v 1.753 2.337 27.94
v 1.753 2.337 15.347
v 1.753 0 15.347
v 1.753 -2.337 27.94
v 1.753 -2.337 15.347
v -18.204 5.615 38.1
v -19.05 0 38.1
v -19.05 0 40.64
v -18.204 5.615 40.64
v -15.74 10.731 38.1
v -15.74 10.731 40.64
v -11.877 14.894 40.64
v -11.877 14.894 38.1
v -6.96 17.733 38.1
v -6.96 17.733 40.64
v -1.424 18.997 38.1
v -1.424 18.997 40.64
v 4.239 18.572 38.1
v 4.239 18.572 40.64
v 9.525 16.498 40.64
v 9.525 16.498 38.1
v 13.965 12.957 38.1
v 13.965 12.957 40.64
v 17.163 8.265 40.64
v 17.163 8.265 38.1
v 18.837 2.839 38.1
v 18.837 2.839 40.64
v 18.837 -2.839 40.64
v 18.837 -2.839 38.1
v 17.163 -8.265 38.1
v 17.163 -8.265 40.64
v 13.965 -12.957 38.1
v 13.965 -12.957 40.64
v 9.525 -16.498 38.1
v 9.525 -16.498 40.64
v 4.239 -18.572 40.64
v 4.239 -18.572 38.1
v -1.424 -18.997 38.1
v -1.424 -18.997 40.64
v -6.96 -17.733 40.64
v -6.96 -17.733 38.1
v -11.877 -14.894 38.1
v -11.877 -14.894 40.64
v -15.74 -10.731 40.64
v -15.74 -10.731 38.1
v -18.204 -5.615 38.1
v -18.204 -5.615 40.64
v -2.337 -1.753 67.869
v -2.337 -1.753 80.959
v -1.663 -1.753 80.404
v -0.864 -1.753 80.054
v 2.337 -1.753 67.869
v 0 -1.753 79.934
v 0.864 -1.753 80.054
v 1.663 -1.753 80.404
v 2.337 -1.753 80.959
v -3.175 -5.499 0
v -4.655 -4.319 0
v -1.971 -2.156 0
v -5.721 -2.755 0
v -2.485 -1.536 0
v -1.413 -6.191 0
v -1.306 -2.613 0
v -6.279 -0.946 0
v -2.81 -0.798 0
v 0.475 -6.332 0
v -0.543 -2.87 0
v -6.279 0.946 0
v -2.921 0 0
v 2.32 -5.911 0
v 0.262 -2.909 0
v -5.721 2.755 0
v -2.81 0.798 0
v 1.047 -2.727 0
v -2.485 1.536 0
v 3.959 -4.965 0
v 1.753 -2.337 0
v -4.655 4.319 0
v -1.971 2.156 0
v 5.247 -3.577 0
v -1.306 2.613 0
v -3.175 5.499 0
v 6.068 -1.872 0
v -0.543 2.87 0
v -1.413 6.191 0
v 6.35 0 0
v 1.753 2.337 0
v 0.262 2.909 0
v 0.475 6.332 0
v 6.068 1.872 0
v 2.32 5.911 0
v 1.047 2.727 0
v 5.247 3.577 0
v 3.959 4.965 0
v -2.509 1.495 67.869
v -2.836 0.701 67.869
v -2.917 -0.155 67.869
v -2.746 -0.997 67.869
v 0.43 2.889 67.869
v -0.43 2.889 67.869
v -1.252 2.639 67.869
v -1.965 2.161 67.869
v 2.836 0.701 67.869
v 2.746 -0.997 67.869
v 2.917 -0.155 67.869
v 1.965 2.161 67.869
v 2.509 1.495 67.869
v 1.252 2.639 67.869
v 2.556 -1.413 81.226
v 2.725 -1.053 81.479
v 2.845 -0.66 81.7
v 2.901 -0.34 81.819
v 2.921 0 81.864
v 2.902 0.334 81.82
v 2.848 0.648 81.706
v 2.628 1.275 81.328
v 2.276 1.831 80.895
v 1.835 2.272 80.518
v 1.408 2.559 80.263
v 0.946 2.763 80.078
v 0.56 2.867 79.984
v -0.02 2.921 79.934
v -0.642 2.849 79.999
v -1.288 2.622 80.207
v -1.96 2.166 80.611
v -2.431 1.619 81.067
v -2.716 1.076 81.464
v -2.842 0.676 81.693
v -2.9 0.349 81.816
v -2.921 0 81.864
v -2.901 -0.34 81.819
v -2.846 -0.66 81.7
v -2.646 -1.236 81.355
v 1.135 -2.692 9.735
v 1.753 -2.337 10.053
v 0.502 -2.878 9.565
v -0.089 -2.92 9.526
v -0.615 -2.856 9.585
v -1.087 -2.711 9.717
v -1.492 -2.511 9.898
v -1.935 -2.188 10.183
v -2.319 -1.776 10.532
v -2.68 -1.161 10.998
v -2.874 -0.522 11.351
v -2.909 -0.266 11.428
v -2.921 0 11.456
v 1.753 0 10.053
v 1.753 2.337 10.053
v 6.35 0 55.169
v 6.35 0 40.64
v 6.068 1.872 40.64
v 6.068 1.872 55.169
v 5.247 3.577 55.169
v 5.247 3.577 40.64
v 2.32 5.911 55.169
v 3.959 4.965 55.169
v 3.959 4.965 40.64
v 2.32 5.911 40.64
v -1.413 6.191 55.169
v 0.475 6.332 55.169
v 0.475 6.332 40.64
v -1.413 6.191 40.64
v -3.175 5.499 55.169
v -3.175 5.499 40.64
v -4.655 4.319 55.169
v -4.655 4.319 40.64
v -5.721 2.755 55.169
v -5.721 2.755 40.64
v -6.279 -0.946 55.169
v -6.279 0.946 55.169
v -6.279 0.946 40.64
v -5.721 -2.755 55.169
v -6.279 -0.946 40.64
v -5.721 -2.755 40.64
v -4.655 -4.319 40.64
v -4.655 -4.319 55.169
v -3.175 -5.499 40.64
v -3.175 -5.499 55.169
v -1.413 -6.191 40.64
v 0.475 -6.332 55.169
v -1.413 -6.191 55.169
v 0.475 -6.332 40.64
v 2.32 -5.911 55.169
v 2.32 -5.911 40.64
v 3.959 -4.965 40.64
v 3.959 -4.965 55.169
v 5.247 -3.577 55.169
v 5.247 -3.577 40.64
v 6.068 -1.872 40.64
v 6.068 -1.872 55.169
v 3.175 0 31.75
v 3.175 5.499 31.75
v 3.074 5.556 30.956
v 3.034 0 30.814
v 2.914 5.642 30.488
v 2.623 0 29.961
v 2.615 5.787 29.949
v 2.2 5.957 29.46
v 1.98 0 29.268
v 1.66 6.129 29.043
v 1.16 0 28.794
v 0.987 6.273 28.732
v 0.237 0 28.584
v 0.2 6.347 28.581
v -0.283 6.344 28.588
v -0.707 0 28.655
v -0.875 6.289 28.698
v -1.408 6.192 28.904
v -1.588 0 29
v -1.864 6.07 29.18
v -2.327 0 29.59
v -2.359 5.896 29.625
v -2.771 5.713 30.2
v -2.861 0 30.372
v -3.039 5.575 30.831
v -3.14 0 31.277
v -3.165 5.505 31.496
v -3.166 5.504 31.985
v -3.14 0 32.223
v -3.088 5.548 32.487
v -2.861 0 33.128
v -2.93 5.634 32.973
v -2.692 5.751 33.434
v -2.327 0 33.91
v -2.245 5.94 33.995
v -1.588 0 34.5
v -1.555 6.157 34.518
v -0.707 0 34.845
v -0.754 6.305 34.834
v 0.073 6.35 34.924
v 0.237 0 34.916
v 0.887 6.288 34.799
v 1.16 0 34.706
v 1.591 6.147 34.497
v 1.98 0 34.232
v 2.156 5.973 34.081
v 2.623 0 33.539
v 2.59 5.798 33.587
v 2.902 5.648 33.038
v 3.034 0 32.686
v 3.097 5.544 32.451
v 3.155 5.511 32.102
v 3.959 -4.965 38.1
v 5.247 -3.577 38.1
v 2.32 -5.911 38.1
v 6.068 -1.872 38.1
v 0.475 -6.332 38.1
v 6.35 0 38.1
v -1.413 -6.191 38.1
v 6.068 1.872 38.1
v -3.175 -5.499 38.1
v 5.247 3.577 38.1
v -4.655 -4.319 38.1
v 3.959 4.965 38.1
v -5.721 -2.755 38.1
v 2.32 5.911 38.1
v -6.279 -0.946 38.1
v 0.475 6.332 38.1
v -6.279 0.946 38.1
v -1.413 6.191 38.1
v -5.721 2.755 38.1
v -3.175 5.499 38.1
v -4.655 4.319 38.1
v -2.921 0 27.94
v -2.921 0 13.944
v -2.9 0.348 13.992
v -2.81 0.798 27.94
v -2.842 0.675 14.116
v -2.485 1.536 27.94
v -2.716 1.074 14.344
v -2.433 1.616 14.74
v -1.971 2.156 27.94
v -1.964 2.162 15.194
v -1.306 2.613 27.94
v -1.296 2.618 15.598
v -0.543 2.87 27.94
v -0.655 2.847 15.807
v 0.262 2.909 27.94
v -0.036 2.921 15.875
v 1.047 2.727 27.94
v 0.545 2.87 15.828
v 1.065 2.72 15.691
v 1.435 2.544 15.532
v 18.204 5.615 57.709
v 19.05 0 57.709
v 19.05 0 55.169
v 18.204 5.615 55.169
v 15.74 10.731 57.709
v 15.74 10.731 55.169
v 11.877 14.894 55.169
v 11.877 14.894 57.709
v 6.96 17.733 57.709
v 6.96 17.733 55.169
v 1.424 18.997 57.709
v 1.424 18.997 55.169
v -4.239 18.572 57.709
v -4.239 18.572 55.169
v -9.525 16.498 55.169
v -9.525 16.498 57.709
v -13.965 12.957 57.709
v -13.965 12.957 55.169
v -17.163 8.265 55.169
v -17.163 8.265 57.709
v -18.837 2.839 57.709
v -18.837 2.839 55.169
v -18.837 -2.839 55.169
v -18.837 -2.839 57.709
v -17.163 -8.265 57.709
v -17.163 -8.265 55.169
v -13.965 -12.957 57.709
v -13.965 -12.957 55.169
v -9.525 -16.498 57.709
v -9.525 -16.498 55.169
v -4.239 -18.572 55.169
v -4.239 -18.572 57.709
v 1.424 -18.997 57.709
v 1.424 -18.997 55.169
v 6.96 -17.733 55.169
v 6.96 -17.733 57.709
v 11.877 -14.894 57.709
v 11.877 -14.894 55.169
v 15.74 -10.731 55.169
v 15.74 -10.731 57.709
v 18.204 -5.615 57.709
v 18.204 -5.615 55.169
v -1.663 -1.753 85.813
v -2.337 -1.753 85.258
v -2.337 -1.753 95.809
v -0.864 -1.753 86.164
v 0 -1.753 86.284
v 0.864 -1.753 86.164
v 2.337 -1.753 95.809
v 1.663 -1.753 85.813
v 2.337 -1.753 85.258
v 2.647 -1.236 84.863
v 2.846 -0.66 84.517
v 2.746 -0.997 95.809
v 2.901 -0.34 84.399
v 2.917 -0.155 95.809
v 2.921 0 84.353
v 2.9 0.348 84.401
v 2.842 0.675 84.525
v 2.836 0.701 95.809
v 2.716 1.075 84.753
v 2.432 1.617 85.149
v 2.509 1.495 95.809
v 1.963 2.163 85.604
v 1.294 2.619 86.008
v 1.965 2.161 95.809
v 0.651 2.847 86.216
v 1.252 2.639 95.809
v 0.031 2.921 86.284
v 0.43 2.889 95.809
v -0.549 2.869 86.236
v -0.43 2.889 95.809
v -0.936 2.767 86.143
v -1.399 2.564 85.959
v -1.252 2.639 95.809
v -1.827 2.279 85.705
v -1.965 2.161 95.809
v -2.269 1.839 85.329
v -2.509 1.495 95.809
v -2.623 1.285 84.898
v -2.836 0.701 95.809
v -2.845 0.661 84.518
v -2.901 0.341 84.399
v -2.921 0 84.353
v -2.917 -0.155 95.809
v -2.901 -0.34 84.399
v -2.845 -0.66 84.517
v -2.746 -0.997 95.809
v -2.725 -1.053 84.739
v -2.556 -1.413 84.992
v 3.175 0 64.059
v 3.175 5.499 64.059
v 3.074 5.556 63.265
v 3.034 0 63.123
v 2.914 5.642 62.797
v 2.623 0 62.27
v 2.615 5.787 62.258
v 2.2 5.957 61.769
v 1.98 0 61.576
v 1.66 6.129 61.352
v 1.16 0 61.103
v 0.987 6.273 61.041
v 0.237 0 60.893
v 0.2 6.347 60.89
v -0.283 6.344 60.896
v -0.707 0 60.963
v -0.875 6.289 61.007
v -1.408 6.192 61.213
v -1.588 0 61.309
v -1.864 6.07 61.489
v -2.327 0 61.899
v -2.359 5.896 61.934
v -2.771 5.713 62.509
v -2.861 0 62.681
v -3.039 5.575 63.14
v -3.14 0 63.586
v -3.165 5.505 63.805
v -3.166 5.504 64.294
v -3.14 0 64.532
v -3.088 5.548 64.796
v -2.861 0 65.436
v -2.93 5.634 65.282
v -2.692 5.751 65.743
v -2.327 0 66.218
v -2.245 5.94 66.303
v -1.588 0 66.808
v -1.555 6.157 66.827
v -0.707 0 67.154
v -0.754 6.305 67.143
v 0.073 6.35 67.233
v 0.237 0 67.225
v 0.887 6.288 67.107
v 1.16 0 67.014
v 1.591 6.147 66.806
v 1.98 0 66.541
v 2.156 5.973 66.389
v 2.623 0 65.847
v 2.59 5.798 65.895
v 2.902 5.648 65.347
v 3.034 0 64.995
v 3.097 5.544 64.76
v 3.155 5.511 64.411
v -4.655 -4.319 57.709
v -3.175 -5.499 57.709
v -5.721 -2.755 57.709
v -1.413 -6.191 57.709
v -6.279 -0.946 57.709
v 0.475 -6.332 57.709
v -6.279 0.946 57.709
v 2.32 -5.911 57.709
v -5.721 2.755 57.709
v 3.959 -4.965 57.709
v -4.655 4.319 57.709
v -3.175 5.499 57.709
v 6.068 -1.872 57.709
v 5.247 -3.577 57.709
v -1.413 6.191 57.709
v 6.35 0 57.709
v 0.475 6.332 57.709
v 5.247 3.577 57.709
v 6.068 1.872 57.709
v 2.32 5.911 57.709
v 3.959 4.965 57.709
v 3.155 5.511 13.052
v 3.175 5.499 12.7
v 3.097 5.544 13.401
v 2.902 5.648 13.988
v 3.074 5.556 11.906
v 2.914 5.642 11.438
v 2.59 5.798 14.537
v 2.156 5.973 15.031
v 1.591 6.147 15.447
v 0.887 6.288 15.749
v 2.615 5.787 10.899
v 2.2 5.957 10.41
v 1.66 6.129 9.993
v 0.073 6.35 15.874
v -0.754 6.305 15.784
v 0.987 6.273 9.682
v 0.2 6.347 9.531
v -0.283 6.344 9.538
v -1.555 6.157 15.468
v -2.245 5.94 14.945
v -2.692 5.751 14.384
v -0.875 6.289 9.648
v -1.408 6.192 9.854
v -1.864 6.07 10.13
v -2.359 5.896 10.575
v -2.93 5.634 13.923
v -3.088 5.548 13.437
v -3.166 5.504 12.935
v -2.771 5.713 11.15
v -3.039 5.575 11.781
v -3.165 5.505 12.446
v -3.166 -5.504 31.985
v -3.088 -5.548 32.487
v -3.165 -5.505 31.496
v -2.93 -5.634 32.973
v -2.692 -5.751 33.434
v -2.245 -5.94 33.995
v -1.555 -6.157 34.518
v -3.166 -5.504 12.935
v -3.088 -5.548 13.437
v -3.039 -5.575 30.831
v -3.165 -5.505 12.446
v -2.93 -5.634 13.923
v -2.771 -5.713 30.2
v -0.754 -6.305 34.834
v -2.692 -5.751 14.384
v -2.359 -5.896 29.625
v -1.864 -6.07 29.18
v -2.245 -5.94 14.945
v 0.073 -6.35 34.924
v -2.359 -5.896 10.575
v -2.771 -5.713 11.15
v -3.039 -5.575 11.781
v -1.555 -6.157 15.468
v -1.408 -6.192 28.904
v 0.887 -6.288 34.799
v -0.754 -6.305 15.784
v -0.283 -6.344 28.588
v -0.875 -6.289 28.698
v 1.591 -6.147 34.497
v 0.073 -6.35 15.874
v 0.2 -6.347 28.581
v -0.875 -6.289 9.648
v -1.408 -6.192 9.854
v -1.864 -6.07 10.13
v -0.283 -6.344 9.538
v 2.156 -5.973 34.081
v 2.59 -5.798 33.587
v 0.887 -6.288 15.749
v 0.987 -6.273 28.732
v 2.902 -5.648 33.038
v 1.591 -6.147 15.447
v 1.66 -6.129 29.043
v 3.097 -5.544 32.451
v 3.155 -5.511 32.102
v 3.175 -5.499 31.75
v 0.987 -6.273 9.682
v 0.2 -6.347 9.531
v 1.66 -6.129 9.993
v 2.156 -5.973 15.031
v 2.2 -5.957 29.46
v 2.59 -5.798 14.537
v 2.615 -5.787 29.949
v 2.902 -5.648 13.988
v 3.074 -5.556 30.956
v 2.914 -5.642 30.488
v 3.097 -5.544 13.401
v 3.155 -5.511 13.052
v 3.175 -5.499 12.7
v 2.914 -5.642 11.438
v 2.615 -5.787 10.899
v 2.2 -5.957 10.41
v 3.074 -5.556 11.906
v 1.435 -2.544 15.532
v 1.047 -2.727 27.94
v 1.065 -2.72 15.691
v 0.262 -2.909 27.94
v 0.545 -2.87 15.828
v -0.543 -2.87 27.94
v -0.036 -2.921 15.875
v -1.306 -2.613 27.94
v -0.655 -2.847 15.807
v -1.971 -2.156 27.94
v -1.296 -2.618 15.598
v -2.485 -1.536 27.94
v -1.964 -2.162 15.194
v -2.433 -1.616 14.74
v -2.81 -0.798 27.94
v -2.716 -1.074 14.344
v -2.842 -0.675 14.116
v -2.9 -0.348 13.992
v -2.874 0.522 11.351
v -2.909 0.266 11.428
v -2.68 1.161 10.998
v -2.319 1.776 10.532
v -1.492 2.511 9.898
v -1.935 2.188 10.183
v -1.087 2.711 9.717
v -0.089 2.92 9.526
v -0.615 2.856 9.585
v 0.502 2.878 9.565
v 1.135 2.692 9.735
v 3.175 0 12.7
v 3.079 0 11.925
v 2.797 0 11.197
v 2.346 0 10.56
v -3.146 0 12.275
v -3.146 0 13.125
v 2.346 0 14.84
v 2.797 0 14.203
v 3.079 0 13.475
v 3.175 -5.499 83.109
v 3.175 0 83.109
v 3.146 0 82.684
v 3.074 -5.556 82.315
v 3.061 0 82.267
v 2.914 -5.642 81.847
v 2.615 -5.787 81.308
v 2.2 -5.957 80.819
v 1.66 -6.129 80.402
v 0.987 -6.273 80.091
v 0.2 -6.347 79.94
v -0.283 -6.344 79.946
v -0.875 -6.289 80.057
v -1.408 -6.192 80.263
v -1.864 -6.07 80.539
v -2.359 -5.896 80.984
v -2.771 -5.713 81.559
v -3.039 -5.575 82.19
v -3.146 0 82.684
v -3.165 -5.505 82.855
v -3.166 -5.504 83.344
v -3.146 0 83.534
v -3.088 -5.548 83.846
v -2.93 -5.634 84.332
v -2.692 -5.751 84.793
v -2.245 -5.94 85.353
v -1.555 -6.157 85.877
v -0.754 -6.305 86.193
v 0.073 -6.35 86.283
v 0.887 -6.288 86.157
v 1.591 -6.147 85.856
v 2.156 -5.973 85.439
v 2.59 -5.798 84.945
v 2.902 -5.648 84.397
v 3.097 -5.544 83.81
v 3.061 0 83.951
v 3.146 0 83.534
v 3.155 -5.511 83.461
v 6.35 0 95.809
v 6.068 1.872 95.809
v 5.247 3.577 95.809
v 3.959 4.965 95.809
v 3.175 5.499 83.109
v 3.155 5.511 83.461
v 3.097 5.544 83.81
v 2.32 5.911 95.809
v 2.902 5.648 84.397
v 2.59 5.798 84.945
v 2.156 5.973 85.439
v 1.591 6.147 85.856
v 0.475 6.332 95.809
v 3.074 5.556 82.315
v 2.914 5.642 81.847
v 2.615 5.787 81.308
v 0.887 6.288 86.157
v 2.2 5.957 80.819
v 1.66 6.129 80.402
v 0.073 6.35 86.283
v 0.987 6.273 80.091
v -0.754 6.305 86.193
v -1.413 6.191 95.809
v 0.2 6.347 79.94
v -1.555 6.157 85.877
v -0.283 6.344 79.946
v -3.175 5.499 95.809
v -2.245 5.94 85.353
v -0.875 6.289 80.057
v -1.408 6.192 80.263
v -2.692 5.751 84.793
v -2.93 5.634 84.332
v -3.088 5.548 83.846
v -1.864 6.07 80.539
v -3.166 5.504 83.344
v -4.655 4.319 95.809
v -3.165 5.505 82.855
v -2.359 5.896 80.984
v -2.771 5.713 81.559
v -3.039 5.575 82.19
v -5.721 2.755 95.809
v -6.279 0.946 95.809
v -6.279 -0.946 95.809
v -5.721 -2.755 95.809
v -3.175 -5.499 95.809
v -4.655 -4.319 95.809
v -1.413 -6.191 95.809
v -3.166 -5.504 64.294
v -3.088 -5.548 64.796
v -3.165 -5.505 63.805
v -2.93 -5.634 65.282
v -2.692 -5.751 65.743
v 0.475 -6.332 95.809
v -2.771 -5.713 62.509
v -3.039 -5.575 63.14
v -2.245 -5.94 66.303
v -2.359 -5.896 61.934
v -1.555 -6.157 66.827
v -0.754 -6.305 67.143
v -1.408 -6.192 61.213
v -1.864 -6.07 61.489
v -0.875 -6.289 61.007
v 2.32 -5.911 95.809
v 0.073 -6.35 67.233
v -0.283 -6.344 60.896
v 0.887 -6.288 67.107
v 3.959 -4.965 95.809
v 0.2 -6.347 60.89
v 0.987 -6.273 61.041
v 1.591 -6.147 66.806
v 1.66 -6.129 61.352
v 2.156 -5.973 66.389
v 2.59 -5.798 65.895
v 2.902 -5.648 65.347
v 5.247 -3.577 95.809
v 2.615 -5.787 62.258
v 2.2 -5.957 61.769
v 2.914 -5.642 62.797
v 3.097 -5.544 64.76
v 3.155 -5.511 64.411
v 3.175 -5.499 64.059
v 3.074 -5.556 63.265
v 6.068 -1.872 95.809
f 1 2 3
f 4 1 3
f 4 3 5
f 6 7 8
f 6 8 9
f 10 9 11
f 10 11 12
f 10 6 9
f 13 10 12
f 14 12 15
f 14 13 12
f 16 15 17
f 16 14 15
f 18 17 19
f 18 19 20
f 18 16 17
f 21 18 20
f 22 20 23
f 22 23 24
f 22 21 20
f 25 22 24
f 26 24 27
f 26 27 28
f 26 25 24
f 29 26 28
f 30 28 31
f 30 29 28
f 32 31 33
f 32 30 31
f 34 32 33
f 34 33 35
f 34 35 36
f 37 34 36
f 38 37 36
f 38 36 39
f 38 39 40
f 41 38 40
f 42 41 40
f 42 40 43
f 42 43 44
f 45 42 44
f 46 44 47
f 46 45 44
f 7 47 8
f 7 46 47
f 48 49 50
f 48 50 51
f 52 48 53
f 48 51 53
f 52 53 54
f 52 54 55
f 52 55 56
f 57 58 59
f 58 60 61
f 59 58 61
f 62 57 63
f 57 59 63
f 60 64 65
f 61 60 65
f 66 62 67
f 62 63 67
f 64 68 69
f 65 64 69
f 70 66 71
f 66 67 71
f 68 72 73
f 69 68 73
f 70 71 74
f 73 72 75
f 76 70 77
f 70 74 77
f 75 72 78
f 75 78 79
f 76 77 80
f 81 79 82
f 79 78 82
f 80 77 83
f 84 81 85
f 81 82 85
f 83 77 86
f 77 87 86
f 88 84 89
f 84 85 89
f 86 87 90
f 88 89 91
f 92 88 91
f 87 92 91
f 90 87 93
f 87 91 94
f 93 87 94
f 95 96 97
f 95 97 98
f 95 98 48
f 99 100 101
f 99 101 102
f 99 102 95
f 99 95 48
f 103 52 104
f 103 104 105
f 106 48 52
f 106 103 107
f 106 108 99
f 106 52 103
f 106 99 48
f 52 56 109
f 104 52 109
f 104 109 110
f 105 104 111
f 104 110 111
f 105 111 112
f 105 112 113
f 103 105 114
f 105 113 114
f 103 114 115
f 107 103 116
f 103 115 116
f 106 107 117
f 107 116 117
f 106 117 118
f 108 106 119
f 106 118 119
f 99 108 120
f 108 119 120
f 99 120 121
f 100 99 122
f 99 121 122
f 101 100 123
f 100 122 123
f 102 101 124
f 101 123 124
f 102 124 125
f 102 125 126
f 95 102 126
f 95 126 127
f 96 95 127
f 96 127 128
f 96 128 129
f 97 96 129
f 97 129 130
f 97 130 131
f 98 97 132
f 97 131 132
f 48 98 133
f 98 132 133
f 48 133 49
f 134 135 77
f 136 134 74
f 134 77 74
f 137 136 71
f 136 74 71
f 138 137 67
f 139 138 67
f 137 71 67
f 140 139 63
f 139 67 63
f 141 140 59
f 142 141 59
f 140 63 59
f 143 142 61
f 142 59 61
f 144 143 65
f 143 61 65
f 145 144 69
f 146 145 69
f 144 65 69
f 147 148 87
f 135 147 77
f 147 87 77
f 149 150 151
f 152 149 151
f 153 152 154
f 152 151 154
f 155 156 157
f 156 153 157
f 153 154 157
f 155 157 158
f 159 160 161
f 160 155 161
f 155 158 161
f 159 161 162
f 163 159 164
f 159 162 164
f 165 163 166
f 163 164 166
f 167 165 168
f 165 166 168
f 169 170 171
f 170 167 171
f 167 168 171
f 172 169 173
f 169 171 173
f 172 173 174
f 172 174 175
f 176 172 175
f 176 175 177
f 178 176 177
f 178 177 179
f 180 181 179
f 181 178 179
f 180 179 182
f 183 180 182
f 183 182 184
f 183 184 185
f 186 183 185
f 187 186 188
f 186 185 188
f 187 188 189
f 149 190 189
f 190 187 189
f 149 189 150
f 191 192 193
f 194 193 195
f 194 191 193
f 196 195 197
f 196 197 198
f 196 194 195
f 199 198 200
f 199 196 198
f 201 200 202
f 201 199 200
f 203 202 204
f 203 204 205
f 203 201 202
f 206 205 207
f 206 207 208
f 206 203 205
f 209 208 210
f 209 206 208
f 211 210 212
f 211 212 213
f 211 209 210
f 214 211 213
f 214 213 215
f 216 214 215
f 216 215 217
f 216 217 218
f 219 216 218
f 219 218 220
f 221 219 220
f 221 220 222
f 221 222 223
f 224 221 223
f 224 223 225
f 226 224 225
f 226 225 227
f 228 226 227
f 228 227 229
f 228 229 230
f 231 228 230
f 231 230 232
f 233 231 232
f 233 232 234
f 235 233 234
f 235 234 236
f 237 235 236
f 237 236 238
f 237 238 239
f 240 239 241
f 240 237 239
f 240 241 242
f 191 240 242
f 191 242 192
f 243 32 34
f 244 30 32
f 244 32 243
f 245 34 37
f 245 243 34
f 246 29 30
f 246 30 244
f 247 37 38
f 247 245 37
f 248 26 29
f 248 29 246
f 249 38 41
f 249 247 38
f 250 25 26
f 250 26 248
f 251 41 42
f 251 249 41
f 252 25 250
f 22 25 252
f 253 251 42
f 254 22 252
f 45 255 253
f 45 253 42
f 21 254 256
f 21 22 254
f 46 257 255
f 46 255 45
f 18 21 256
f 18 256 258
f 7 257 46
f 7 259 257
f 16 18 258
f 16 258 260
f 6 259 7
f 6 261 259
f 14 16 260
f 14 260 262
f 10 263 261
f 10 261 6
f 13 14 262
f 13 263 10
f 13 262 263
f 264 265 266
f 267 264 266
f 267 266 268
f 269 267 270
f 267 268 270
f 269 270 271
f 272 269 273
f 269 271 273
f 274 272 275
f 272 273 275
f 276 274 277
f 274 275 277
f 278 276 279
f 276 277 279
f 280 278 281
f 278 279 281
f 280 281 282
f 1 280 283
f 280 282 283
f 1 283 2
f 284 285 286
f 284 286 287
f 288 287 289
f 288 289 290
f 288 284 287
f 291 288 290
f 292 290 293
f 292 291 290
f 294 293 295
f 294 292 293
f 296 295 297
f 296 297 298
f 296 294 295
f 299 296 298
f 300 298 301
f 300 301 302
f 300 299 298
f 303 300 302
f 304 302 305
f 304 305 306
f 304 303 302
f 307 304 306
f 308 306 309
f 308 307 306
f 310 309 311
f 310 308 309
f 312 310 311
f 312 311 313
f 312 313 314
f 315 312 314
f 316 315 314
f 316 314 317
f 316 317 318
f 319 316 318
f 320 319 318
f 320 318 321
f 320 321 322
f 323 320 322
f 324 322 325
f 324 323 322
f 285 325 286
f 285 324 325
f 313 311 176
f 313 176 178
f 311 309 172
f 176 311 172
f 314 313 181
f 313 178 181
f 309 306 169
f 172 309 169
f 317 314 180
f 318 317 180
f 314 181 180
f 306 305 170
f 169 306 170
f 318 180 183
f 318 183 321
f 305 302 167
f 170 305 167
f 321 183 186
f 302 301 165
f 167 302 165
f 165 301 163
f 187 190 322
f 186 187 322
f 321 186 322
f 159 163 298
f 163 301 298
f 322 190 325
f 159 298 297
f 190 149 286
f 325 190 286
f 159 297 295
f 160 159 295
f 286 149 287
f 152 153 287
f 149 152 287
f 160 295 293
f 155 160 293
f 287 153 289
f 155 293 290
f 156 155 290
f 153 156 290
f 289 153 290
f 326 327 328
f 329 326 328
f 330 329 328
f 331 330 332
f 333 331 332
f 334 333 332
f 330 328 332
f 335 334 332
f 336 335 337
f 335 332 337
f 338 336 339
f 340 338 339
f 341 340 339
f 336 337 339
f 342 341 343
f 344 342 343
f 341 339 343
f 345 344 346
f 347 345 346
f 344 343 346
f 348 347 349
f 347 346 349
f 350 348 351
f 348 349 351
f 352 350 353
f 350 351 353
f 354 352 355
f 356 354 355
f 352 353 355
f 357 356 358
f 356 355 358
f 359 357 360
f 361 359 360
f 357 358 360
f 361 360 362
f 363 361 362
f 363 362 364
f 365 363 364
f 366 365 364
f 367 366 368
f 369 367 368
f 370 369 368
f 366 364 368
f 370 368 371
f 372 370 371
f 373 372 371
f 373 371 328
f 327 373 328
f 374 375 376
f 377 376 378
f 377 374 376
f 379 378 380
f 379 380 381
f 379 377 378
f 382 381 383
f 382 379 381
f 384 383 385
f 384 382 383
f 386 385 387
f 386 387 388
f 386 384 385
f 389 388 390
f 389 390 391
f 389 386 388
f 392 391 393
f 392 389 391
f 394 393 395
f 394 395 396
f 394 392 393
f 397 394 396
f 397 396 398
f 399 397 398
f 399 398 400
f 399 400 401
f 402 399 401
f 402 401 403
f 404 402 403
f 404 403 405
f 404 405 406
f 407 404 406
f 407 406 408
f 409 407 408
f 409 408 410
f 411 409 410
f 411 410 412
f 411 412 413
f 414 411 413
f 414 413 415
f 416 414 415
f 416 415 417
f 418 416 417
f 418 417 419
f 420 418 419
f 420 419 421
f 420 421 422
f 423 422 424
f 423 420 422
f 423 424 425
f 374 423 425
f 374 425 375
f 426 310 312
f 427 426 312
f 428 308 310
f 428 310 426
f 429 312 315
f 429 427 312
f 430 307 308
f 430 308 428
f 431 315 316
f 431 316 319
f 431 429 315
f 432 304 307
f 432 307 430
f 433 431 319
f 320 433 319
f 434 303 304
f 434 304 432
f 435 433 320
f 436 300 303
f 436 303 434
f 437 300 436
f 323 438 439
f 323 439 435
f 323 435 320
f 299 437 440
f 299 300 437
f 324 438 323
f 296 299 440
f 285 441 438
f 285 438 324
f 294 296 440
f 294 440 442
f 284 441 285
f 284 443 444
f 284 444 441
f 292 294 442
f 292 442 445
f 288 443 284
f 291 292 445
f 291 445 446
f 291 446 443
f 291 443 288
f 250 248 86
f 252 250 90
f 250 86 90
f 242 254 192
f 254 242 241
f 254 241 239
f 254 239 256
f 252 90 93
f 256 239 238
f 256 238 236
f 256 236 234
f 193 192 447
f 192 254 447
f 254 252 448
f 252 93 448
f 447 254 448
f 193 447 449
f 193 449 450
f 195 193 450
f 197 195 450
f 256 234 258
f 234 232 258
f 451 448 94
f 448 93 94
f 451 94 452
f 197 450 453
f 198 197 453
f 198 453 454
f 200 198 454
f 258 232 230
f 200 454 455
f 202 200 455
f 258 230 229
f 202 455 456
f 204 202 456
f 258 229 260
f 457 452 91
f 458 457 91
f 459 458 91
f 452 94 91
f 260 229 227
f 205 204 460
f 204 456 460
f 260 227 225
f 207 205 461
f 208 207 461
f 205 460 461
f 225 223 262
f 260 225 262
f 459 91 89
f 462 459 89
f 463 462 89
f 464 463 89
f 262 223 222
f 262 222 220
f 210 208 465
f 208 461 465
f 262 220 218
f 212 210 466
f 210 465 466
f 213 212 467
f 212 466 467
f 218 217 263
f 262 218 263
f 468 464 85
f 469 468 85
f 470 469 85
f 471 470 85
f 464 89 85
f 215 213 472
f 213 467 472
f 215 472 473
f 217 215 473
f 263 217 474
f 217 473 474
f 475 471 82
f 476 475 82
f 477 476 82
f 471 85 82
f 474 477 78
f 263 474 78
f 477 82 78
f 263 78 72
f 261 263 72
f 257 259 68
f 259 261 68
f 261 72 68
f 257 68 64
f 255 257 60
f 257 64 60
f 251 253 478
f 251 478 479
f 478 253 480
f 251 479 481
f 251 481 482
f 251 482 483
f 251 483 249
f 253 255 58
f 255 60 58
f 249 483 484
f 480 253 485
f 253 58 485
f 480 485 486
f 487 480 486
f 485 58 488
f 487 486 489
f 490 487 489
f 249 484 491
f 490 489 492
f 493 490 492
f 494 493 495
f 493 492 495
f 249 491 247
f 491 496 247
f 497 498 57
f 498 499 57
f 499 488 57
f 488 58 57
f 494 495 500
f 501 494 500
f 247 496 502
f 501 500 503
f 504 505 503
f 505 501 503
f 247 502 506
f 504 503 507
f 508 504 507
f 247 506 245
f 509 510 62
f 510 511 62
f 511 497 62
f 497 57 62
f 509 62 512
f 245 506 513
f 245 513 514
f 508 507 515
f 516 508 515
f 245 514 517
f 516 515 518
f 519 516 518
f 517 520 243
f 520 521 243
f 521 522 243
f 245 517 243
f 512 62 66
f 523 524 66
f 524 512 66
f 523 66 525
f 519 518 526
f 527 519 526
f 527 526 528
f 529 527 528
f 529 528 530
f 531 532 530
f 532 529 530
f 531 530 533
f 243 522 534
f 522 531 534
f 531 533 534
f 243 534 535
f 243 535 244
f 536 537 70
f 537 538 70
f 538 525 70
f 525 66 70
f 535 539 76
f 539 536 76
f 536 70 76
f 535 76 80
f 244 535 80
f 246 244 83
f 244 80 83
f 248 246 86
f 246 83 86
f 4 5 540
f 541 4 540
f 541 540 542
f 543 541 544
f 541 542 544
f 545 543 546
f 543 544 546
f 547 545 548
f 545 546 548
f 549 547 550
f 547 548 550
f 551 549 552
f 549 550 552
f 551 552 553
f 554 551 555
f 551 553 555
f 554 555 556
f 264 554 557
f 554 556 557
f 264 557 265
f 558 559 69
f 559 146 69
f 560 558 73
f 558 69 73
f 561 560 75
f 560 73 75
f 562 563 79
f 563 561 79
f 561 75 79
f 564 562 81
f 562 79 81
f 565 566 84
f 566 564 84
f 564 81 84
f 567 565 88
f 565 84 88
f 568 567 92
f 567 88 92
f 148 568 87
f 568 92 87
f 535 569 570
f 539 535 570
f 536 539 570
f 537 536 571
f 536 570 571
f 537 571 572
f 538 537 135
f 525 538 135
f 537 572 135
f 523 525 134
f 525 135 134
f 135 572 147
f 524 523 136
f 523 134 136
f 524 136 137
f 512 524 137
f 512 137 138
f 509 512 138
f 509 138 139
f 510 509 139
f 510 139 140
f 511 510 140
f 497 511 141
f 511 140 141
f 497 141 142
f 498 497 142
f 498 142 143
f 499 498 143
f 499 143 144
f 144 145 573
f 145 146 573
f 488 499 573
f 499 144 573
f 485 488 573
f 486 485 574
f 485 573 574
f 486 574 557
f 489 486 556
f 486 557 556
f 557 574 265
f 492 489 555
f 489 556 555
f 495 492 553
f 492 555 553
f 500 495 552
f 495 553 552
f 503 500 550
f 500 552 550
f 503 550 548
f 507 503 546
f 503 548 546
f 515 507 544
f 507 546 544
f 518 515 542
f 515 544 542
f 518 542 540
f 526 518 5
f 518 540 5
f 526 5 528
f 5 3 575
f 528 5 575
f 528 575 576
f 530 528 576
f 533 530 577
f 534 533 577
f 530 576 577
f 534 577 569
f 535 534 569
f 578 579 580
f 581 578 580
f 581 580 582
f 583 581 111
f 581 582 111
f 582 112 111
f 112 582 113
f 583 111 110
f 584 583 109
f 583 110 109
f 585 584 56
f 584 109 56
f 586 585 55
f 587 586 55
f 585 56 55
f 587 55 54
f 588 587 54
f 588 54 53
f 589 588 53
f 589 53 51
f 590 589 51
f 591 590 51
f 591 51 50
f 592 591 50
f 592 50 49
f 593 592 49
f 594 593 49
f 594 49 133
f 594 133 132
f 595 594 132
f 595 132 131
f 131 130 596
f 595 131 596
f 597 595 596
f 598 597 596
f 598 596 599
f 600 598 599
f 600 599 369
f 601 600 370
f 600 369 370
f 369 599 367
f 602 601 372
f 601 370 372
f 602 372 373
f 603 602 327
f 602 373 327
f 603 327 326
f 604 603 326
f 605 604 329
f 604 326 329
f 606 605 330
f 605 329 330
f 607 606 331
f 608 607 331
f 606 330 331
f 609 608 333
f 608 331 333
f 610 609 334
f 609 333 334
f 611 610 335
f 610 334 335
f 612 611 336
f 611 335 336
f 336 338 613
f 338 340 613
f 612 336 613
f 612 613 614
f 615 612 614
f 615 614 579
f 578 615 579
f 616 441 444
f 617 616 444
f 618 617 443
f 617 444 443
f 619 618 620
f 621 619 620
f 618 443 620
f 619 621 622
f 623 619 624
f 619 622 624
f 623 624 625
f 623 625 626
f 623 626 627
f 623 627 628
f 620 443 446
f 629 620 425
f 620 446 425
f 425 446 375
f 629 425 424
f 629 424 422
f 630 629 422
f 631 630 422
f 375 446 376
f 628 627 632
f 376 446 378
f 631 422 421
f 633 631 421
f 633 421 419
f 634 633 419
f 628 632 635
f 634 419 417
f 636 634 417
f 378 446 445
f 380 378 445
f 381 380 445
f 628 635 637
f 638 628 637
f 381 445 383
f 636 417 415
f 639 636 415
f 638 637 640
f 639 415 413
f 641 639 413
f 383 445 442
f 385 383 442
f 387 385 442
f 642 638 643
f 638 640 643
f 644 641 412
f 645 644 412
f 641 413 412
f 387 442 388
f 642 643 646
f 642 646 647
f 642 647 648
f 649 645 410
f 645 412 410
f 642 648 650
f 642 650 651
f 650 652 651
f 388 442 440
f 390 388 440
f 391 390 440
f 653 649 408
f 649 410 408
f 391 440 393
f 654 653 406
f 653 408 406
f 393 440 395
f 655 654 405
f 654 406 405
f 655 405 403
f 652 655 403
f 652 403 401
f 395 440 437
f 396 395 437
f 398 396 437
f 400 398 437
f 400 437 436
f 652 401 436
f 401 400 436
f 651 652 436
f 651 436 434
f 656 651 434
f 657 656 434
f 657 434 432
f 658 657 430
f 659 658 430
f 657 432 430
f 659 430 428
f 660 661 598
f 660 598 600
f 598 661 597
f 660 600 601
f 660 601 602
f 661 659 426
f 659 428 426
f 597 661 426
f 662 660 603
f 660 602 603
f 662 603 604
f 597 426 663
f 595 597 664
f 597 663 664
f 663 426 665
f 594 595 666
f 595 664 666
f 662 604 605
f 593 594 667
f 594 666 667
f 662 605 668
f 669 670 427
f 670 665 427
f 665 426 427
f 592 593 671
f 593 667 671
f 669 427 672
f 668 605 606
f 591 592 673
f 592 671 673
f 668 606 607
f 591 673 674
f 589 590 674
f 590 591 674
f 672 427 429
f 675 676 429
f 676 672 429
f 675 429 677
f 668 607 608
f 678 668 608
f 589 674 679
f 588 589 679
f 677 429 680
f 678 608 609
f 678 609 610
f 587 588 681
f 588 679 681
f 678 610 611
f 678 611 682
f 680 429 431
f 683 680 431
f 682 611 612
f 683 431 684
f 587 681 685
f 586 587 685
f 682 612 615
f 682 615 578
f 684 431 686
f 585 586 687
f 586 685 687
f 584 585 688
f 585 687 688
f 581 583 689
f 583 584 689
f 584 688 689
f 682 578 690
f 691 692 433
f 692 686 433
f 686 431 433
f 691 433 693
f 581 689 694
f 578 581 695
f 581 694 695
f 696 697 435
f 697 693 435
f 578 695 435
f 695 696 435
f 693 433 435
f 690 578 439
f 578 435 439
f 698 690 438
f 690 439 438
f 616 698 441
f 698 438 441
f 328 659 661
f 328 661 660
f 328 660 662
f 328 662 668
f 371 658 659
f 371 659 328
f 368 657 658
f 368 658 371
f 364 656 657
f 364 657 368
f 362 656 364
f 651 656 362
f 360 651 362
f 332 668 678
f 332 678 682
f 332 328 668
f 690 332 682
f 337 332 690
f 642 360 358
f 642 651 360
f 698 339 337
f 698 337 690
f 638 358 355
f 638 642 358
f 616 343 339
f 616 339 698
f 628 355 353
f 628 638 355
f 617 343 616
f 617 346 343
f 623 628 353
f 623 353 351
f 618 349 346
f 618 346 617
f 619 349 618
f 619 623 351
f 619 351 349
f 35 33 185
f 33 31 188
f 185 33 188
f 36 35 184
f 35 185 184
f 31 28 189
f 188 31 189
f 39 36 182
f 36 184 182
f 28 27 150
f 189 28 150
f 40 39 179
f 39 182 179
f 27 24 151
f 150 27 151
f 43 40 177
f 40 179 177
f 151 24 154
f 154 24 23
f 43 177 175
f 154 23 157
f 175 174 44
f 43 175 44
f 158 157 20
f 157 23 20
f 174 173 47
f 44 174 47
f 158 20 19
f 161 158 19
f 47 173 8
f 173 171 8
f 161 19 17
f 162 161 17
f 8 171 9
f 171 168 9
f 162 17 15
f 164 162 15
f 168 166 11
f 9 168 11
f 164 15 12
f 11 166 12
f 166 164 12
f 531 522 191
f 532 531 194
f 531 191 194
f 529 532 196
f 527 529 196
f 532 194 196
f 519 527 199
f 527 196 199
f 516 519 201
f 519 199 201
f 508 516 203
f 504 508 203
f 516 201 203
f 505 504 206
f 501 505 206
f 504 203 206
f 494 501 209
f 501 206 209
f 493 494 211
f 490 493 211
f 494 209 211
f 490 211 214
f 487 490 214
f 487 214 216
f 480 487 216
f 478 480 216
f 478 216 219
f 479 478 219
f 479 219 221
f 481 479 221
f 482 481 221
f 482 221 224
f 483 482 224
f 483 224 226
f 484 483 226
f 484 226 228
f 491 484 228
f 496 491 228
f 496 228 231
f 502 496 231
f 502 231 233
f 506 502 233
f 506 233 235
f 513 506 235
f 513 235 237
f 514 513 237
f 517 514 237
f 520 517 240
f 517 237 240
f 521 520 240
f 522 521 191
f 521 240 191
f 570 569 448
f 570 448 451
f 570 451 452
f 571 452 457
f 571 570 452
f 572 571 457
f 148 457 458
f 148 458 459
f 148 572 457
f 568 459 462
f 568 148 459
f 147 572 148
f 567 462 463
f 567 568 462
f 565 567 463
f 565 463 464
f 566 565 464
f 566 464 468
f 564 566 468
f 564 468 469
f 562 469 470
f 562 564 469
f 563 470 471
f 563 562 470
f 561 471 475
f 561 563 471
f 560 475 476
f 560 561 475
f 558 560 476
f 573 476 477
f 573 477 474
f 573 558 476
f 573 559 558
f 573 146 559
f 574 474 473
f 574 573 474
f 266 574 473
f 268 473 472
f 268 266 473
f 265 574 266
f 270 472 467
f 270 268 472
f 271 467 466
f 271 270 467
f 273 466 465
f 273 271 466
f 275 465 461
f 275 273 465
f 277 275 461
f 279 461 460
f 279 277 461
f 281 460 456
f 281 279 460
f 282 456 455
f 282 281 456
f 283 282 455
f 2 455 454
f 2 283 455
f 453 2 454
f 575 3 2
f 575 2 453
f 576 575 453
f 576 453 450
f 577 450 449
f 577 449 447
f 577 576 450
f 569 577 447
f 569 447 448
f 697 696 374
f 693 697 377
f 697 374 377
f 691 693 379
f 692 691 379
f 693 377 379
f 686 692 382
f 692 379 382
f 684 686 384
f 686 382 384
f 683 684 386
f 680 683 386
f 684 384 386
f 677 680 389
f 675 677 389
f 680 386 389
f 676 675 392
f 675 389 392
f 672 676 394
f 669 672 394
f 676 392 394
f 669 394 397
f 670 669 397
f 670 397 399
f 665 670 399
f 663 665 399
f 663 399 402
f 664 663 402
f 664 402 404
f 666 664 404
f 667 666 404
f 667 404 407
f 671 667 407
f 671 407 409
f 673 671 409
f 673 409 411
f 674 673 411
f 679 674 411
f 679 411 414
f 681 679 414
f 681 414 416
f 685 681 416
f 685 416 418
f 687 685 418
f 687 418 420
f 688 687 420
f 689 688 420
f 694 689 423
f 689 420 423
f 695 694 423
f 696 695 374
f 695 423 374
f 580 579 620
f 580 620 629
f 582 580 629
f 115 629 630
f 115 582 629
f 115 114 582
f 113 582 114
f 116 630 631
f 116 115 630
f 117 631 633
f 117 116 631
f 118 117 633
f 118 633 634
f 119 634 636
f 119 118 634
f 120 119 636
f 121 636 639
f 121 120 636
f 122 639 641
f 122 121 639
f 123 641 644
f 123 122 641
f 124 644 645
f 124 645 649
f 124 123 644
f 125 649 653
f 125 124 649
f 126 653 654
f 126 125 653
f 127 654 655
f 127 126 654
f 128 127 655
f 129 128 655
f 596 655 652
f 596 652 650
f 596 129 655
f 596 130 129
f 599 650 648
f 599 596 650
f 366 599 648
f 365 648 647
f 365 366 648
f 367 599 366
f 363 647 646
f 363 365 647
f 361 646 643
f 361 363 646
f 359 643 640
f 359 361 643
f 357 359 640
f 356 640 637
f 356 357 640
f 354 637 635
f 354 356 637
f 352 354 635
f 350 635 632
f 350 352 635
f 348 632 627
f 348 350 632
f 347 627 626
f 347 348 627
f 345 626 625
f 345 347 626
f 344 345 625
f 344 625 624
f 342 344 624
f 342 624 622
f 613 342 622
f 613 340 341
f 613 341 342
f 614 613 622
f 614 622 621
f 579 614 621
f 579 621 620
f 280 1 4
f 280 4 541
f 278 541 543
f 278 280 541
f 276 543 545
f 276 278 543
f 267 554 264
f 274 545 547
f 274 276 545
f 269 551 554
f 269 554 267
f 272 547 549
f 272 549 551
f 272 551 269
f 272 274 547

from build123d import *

# Parameters (mm, degrees)
SKETCH1_R               = 6.35
BOSS_EXTRUDE1_DEPTH     = 95.8088
SKETCH4_R               = 3.175
CUT_EXTRUDE2_DEPTH      = 7.35
CUT_EXTRUDE2_DEPTH_BACK = 7.35
SKETCH5_R               = 19.05
BOSS_EXTRUDE2_DEPTH     = 2.54
SKETCH6_R               = 19.05
BOSS_EXTRUDE3_DEPTH     = 2.54
CUT_EXTRUDE4_DEPTH      = 27.94
CUT_EXTRUDE5_DEPTH      = 27.94


with BuildPart() as part:
    # Sketch1 → Boss-Extrude1 (new body)
    with BuildSketch(Plane.XY):
        Circle(SKETCH1_R)
    extrude(amount=BOSS_EXTRUDE1_DEPTH)

    # Sketch4 → Cut-Extrude2 (cut, two sides)
    with BuildSketch(Plane(origin=(0, 0, 0), x_dir=(1, 0, 0), z_dir=(0, 1, 0))) as cut_extrude2_sk:
        with Locations((0, -83.1088)):
            Circle(SKETCH4_R)
        with Locations((0, -12.7)):
            Circle(SKETCH4_R)
        with Locations((0, -64.0588)):
            Circle(SKETCH4_R)
        with Locations((0, -31.75)):
            Circle(SKETCH4_R)
    extrude(amount=CUT_EXTRUDE2_DEPTH, mode=Mode.SUBTRACT)
    extrude(cut_extrude2_sk.sketch, amount=-CUT_EXTRUDE2_DEPTH_BACK, mode=Mode.SUBTRACT)

    # Sketch5 → Boss-Extrude2 (add)
    with BuildSketch(Plane.XY.offset(57.7088)):
        Circle(SKETCH5_R)
    extrude(amount=-BOSS_EXTRUDE2_DEPTH)

    # Sketch6 → Boss-Extrude3 (add)
    with BuildSketch(Plane(origin=(0, 0, 38.1), x_dir=(-1, 0, 0), z_dir=(0, 0, -1))):
        Circle(SKETCH6_R)
    extrude(amount=-BOSS_EXTRUDE3_DEPTH)

    # Sketch2 → Cut-Extrude4 (cut)
    with BuildSketch(Plane.XY.offset(95.8088)):
        with BuildLine():
            Line((-2.3368, -1.7526), (2.3368, -1.7526))
            ThreePointArc((2.3368, -1.7526), (0, 2.921), (-2.3368, -1.7526))
        make_face()
    extrude(amount=-CUT_EXTRUDE4_DEPTH, mode=Mode.SUBTRACT)

    # Sketch7 → Cut-Extrude5 (cut)
    with BuildSketch(Plane(origin=(0, 0, 0), x_dir=(-1, 0, 0), z_dir=(0, 0, -1))):
        with BuildLine():
            Line((-1.7526, 2.3368), (-1.7526, -2.3368))
            ThreePointArc((-1.7526, -2.3368), (1.306310912, -2.612621825), (2.921, 0))
            ThreePointArc((2.921, 0), (1.306310912, 2.612621825), (-1.7526, 2.3368))
        make_face()
    extrude(amount=-CUT_EXTRUDE5_DEPTH, mode=Mode.SUBTRACT)


solid = part.part
